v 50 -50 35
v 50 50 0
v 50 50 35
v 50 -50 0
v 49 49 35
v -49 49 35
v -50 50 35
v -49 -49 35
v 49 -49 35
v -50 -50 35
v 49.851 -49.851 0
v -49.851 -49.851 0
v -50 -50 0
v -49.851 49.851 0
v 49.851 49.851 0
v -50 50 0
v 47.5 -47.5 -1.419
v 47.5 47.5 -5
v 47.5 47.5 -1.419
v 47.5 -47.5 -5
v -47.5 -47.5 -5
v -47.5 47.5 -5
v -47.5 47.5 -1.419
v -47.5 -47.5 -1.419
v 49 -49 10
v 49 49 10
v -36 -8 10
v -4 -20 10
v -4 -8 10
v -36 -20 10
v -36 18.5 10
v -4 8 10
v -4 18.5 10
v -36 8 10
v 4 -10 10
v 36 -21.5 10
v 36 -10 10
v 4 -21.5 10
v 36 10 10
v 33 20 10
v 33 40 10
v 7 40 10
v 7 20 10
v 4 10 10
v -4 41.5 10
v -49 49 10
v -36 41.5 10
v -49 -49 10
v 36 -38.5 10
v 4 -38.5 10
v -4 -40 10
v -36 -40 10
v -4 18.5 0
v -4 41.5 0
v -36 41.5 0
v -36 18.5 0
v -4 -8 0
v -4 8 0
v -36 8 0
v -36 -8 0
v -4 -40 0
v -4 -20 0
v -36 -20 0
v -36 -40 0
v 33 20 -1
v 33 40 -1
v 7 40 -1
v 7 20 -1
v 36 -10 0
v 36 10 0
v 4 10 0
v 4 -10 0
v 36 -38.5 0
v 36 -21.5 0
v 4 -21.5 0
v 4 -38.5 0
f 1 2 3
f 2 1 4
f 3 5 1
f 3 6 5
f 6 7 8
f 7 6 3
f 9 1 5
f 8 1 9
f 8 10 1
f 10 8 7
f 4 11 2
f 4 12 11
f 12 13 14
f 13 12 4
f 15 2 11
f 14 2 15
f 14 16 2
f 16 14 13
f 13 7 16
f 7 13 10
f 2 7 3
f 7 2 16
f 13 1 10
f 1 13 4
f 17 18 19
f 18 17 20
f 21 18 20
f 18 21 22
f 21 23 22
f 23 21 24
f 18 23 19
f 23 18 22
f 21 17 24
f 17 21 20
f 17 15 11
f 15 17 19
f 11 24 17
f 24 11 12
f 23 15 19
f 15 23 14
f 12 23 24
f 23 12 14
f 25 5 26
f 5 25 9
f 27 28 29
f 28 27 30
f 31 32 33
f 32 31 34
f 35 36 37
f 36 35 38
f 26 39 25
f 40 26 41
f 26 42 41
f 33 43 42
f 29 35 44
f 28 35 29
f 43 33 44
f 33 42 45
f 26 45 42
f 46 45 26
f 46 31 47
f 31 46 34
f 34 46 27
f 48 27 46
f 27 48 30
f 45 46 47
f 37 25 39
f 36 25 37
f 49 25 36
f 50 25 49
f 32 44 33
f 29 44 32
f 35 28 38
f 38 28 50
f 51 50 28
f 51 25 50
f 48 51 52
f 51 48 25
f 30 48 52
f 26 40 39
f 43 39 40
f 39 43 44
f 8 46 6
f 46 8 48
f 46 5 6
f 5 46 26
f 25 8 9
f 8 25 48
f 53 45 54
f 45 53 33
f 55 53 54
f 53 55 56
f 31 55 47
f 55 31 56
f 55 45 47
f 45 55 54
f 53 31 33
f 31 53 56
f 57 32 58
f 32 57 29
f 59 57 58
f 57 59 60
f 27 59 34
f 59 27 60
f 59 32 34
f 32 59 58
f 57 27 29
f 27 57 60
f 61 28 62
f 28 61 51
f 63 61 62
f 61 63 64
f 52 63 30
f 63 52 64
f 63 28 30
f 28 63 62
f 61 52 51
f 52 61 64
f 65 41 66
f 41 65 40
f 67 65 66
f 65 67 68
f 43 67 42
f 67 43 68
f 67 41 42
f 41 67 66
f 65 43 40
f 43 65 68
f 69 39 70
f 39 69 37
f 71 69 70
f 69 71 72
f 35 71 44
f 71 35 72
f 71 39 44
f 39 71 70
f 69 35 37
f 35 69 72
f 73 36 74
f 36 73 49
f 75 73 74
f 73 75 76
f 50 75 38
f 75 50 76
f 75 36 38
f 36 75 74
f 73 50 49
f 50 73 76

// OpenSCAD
H=35;               // Height of main box
H2=5;               // Height of bottom centering
SIDE=100;           // Side of box
D=2;                // Wall-thickness of box
D2=2.5;             // Setback of centering
HI=25;              // Inner Cut-Out

difference() {
    union() {
        translate([0,0,H/2]) cube([SIDE,SIDE,H], center=true );                                     // Main Box 100x100x40
        translate([0,0,-H2/2]) cube([SIDE-2*D2,SIDE-2*D2,H2],center=true);                          // Bottom
        translate([0,0,-2]) rotate([0,0,45]) cylinder(h=2,d1=1.35*(SIDE-D2),d2=1.41*SIDE,$fn=4);    // Chamfer
    }
    translate([0,0, 2*H-HI]) cube([SIDE-D,SIDE-D,2*H],center=true);                                  // Inner Cut-Out
    

    translate([ -20, 30,10]) cube([32,23,20], center=true); // Rect-Tokens: Door
    translate([ -20,  0,10]) cube([32,16,20], center=true); // Rect-Tokens: Picture on the Wall
    translate([ -20,-30,10]) cube([32,20,20], center=true); // Rect-Tokens: Overgrown (Serpent)
    translate([  20, 30,12]) cube([26,20,26], center=true); // Square-Tokens
    translate([  20,  0,10]) cube([32,20,20], center=true); // Rect-Tokens: Wooden Door (Serpent)
    translate([  20,-30,10]) cube([32,17,20], center=true); // Rect-Tokens: Chest

//    translate([0,-70,0]) cube([300,200,300],center=true); // Tester
   
}
